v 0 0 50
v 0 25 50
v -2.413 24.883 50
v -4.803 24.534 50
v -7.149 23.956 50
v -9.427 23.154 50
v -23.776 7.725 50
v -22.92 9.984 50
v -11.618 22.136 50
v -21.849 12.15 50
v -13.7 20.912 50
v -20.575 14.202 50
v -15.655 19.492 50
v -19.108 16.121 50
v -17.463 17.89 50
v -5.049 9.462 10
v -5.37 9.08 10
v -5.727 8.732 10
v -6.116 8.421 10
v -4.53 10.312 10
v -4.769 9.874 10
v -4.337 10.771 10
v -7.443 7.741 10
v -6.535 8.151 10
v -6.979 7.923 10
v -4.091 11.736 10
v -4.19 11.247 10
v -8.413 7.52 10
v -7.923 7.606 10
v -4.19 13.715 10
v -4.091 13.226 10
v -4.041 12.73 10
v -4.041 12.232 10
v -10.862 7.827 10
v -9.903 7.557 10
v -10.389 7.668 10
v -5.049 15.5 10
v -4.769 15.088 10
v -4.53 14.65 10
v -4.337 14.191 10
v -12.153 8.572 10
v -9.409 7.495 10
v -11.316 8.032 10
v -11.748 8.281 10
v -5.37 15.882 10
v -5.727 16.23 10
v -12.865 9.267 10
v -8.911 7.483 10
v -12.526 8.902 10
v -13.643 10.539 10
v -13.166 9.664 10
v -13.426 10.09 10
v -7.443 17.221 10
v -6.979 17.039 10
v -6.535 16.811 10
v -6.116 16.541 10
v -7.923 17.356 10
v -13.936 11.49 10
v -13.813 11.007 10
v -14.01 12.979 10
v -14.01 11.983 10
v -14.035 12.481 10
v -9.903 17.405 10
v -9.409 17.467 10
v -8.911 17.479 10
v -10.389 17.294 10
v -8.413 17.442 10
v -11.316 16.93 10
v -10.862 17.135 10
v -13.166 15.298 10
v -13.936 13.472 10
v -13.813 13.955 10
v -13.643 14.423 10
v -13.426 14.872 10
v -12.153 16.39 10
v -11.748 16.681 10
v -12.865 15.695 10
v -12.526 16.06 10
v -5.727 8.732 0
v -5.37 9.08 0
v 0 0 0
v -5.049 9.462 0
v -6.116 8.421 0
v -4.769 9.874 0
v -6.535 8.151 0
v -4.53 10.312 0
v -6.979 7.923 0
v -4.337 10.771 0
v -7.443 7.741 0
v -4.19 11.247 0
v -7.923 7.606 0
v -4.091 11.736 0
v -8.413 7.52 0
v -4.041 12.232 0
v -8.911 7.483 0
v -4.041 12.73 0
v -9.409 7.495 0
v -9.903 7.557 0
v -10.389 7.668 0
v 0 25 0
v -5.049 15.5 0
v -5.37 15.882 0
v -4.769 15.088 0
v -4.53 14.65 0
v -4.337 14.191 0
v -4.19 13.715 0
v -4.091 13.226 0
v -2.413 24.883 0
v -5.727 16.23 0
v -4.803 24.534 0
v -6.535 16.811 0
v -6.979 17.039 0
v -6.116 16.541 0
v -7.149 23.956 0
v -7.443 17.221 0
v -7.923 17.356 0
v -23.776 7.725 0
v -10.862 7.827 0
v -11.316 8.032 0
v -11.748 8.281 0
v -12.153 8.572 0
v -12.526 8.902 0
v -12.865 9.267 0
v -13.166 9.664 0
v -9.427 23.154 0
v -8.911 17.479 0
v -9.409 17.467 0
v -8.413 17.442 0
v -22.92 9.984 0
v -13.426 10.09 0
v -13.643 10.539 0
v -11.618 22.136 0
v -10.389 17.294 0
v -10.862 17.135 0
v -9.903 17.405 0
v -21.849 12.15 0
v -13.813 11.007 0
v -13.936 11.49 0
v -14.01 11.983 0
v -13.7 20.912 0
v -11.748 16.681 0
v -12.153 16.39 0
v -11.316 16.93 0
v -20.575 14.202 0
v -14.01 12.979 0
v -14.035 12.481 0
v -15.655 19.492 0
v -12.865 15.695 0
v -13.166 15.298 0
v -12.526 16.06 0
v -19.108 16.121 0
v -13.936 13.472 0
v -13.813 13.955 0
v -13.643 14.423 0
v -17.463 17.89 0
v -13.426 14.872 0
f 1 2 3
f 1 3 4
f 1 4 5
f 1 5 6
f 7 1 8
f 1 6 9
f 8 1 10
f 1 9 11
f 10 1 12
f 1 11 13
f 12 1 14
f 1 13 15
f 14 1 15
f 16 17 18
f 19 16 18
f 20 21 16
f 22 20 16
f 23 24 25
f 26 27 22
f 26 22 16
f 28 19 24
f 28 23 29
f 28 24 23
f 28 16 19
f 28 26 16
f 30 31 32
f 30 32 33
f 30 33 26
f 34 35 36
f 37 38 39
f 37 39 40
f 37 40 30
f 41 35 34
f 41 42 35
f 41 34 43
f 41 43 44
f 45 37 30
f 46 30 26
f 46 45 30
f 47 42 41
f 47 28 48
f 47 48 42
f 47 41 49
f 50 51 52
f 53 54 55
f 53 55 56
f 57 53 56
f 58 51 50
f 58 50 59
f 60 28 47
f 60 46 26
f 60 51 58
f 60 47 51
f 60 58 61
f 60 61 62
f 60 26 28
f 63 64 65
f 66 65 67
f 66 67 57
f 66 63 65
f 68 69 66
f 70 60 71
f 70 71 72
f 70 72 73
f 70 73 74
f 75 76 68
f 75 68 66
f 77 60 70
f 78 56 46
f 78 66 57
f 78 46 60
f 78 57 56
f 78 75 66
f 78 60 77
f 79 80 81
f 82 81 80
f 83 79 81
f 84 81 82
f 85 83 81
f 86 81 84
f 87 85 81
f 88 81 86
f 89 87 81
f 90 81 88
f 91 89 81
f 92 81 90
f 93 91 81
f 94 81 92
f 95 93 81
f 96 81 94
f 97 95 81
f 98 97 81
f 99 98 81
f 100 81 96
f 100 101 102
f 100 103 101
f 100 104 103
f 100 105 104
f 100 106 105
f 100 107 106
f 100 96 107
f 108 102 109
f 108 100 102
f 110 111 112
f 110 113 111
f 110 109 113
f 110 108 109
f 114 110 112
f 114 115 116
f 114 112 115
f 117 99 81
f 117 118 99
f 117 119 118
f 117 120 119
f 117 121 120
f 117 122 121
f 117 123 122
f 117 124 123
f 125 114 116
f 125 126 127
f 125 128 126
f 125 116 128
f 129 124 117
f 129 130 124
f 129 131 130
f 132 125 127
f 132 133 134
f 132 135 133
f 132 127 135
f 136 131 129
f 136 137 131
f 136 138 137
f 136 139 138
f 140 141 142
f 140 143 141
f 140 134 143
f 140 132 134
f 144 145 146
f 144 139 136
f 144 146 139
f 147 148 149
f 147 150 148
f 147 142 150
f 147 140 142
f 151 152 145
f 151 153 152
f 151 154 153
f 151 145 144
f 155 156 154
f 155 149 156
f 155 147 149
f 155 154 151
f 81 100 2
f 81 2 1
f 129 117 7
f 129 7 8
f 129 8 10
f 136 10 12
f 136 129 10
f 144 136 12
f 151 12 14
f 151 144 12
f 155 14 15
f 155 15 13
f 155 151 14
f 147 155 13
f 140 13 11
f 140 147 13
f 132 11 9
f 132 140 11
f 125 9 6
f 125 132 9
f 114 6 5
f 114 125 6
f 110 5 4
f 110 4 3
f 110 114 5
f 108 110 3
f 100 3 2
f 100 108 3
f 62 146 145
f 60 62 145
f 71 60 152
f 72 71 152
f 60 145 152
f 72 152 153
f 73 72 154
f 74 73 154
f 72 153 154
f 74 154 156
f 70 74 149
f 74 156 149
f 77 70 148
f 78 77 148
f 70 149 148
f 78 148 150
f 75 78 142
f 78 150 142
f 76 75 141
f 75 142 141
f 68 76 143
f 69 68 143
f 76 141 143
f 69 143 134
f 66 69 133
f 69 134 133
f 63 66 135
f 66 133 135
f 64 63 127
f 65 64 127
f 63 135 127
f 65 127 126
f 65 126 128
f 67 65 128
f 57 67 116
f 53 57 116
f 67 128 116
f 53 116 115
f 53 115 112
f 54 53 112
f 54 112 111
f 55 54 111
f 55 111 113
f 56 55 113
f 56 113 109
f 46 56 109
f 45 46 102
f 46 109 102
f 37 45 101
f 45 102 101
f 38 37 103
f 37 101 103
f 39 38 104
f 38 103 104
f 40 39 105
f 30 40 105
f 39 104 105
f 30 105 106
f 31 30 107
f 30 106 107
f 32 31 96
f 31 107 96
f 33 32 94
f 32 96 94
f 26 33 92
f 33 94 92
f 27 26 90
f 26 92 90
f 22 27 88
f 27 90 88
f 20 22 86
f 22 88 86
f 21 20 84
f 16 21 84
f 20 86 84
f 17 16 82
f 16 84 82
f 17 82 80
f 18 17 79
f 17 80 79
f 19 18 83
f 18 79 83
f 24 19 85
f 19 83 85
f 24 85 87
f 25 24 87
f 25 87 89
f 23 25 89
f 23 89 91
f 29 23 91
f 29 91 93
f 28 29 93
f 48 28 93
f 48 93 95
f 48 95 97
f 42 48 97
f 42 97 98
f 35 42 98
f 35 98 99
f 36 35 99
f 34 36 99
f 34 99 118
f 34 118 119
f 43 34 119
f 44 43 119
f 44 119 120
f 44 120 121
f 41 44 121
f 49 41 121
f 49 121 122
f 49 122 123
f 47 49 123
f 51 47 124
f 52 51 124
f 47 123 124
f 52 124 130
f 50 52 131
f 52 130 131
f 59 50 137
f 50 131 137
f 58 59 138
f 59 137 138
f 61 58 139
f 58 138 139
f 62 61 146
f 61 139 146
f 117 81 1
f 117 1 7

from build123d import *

# Parameters (mm, degrees)
SALIENTE_EXTRUIR1_DEPTH = 50
CROQUIS2_R              = 5
CORTAR_EXTRUIR1_DEPTH   = 10


with BuildPart() as part:
    # Croquis1 → Saliente-Extruir1 (new body)
    with BuildSketch(Plane.XY):
        with BuildLine():
            Line((0, 25), (0, 0))
            Line((0, 0), (-23.776412907, 7.725424859))
            ThreePointArc((-23.776412907, 7.725424859), (-14.694631307, 20.225424859), (0, 25))
        make_face()
    extrude(amount=SALIENTE_EXTRUIR1_DEPTH)

    # Croquis2 → Cortar-Extruir1 (cut)
    with BuildSketch(Plane(origin=(0, 0, 0), x_dir=(-1, 0, 0), z_dir=(0, 0, -1))):
        with Locations((9.035159756, 12.480979689)):
            Circle(CROQUIS2_R)
    extrude(amount=-CORTAR_EXTRUIR1_DEPTH, mode=Mode.SUBTRACT)


solid = part.part
